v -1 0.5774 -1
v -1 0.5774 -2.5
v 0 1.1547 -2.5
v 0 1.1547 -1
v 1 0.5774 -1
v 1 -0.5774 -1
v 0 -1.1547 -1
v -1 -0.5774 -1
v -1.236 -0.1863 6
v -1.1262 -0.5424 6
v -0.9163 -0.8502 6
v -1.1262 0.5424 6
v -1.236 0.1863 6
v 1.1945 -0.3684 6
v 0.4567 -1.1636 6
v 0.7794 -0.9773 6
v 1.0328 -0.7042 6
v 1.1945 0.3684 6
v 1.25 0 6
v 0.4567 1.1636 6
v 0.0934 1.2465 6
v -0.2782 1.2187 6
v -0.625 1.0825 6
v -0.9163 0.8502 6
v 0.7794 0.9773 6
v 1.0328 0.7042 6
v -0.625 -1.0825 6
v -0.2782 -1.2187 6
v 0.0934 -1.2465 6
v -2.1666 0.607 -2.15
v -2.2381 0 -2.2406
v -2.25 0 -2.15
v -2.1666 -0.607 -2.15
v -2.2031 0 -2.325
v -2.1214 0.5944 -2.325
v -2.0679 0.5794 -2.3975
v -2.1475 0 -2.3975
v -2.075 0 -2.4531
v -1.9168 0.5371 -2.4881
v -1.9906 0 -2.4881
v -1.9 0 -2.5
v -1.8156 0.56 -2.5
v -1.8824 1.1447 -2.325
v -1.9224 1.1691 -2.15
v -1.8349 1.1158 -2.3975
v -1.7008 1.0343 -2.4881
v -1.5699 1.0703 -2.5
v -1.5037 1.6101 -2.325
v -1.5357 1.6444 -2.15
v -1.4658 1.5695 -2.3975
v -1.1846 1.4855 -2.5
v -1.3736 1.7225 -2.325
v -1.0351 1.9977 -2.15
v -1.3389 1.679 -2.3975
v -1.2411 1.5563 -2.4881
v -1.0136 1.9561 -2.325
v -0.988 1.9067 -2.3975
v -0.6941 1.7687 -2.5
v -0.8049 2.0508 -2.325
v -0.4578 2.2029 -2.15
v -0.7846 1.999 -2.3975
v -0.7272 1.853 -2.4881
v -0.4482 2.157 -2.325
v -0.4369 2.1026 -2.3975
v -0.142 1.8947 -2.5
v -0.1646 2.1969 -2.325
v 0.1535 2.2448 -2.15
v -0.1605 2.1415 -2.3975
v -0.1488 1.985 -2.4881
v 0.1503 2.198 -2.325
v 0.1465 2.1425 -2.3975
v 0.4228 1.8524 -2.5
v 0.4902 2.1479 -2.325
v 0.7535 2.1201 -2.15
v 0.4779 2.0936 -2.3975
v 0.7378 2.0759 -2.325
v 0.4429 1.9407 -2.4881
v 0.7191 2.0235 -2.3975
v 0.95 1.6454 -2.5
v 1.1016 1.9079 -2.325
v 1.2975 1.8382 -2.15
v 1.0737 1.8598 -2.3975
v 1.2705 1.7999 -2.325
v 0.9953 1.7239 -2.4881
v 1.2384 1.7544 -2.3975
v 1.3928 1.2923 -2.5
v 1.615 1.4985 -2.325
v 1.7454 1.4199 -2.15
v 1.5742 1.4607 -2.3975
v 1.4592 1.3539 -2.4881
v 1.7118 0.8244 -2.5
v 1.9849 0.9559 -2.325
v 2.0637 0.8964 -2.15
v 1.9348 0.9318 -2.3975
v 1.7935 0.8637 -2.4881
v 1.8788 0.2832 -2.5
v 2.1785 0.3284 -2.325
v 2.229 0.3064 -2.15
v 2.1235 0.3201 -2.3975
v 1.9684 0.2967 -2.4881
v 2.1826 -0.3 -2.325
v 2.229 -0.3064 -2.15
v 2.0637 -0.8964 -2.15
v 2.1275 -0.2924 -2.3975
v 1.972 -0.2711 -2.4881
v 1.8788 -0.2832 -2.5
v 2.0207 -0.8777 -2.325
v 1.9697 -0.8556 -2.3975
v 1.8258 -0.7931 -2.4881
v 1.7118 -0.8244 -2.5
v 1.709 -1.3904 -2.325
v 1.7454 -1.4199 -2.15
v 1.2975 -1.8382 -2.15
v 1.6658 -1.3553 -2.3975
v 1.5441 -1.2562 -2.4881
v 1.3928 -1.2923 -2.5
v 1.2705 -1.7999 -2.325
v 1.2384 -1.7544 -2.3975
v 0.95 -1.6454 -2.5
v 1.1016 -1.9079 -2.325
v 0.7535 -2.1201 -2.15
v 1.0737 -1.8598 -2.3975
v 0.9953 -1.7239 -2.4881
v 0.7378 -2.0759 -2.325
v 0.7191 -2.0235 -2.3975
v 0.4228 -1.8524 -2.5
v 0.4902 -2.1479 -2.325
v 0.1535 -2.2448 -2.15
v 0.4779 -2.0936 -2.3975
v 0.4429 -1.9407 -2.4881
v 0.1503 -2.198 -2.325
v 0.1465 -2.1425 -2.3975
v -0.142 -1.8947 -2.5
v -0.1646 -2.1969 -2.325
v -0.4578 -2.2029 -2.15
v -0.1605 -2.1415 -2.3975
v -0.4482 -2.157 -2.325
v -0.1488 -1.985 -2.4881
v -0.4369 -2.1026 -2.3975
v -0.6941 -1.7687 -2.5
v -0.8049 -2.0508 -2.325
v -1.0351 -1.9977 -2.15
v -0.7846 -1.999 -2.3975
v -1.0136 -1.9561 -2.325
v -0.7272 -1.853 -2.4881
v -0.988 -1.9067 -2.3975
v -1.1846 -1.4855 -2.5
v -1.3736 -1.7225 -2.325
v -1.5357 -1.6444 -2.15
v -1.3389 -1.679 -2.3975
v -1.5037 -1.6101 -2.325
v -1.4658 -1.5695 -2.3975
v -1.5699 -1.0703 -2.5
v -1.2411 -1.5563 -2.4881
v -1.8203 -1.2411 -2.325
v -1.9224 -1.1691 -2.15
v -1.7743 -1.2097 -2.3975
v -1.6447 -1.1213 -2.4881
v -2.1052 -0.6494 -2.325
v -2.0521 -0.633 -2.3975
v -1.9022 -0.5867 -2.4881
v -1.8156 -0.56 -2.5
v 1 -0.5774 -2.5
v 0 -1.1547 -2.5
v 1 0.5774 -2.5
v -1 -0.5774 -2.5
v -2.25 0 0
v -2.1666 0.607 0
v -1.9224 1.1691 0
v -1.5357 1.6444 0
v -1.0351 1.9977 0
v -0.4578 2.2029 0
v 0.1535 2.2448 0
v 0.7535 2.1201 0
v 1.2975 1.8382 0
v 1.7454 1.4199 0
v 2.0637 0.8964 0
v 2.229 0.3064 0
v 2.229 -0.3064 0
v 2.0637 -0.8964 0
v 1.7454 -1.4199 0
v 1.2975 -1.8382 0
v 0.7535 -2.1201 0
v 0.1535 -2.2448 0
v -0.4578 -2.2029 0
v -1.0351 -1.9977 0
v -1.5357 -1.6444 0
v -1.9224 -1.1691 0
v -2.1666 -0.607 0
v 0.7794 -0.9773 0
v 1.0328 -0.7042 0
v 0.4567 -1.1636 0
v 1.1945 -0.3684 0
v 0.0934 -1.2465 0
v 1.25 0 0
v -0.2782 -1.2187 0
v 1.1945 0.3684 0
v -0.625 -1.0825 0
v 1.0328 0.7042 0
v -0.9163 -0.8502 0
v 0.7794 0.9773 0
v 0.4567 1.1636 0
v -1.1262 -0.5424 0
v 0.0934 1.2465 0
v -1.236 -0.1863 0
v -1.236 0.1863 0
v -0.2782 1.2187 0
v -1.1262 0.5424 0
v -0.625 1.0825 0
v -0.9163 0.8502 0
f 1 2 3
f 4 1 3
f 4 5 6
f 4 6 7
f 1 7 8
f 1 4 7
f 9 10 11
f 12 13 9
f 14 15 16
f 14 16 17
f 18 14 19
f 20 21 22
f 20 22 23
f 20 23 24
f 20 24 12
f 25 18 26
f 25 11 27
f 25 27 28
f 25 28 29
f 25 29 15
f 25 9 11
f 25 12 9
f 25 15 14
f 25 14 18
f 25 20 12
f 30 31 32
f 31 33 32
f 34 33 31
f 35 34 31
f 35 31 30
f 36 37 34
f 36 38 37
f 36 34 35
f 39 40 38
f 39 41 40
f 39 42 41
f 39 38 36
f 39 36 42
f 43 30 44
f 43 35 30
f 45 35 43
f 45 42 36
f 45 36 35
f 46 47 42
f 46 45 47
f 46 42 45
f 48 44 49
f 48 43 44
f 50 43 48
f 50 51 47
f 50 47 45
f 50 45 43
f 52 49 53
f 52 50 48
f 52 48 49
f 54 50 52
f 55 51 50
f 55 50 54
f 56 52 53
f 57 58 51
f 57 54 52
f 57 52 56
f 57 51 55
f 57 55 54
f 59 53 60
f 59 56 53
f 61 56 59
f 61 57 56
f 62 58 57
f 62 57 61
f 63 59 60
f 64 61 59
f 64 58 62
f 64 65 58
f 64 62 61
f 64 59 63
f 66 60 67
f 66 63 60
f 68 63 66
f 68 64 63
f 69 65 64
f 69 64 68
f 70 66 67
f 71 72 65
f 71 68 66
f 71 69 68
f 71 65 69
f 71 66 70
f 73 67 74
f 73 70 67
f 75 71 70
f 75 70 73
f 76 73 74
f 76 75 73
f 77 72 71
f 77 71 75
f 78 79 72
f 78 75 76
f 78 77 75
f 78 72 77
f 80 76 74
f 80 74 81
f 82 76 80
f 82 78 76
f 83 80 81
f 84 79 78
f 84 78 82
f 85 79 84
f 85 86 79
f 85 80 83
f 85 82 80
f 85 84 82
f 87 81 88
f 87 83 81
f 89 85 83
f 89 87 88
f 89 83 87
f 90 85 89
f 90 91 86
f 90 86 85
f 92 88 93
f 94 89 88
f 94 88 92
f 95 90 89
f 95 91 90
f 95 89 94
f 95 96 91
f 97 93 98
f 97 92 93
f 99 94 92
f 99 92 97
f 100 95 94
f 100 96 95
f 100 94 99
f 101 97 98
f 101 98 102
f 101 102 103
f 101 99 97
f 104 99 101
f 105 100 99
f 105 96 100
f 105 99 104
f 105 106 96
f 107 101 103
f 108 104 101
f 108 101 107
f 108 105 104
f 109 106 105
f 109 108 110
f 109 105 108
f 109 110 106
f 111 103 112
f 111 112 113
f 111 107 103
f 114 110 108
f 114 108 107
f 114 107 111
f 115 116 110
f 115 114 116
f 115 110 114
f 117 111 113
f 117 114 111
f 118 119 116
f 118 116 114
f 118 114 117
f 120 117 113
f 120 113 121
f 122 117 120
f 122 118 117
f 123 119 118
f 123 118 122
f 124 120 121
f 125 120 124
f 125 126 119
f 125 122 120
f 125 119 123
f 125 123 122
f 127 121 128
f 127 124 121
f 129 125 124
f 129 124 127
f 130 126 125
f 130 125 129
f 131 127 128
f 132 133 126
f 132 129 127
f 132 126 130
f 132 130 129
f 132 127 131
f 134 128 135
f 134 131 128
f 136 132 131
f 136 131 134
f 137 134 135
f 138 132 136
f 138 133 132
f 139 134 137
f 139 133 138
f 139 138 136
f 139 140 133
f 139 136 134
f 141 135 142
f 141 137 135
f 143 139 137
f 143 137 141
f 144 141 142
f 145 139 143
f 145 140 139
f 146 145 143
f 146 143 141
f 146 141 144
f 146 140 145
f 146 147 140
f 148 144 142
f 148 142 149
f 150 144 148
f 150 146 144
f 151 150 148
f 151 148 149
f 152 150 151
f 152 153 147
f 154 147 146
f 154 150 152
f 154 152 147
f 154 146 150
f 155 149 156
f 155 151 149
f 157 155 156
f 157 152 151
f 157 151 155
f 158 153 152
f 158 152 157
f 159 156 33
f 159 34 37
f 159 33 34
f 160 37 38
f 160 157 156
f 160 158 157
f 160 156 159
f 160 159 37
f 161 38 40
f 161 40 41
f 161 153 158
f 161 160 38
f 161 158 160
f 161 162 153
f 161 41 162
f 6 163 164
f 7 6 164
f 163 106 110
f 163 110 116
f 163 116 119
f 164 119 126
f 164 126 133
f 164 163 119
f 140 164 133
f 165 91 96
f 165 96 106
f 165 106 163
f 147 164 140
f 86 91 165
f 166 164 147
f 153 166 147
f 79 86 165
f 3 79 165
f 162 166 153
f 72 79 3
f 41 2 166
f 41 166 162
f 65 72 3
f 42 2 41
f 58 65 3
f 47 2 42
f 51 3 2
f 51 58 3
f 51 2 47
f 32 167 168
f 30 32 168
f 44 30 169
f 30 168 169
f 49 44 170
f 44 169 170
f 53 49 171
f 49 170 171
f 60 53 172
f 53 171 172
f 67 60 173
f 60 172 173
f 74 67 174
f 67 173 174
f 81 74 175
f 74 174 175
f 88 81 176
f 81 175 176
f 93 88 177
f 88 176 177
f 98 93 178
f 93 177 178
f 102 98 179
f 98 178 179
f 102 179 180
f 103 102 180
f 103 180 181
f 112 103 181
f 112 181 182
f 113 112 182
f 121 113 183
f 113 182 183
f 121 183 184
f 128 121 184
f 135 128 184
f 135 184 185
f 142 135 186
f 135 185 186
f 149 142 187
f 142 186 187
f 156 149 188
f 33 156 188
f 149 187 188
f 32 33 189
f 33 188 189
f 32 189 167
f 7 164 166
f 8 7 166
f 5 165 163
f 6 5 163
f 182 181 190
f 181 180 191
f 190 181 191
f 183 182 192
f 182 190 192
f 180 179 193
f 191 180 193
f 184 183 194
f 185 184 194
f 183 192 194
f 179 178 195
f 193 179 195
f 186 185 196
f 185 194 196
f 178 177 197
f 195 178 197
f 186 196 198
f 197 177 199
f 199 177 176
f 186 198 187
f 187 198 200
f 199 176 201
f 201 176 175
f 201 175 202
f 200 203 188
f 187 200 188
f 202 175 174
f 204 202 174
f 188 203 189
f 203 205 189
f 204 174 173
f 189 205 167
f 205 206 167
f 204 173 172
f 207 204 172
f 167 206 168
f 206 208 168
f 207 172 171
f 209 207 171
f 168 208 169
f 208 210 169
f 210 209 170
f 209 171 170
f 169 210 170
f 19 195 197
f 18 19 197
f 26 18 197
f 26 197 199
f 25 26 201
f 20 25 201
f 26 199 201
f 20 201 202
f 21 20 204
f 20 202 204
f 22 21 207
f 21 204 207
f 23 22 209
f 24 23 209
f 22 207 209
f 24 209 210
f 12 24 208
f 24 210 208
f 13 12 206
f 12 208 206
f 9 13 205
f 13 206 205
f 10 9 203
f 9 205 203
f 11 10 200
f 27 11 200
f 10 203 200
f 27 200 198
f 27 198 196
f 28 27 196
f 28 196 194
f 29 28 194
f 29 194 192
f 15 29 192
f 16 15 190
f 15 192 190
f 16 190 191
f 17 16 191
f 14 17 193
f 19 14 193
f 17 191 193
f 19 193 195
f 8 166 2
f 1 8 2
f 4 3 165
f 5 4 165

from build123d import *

# Parameters (mm, degrees)
CROQUIS1_R              = 1.25
SALIENTE_EXTRUIR1_DEPTH = 6
CROQUIS2_R              = 2.25
SALIENTE_EXTRUIR2_DEPTH = 2.5
CORTAR_EXTRUIR1_DEPTH   = 1.5
REDONDEO1_R             = 0.35


with BuildPart() as part:
    # Croquis1 → Saliente-Extruir1 (new body)
    with BuildSketch(Plane.XY):
        Circle(CROQUIS1_R)
    extrude(amount=SALIENTE_EXTRUIR1_DEPTH)

    # Croquis2 → Saliente-Extruir2 (add)
    with BuildSketch(Plane(origin=(0, 0, 0), x_dir=(-1, 0, 0), z_dir=(0, 0, -1))):
        Circle(CROQUIS2_R)
    extrude(amount=SALIENTE_EXTRUIR2_DEPTH)

    # Croquis3 → Cortar-Extruir1 (cut)
    with BuildSketch(Plane(origin=(0, 0, -2.5), x_dir=(-1, 0, 0), z_dir=(0, 0, -1))):
        Polygon((0, -1.154700538), (1, -0.577350269), (1, 0.577350269), (0, 1.154700538), (-1, 0.577350269), (-1, -0.577350269), align=None)
    extrude(amount=-CORTAR_EXTRUIR1_DEPTH, mode=Mode.SUBTRACT)

    # Redondeo1
    redondeo1_edges = [part.edges().sort_by_distance(p)[0] for p in [
        (2.25, 0, -2.5),
    ]]
    fillet(redondeo1_edges, radius=REDONDEO1_R)


solid = part.part
